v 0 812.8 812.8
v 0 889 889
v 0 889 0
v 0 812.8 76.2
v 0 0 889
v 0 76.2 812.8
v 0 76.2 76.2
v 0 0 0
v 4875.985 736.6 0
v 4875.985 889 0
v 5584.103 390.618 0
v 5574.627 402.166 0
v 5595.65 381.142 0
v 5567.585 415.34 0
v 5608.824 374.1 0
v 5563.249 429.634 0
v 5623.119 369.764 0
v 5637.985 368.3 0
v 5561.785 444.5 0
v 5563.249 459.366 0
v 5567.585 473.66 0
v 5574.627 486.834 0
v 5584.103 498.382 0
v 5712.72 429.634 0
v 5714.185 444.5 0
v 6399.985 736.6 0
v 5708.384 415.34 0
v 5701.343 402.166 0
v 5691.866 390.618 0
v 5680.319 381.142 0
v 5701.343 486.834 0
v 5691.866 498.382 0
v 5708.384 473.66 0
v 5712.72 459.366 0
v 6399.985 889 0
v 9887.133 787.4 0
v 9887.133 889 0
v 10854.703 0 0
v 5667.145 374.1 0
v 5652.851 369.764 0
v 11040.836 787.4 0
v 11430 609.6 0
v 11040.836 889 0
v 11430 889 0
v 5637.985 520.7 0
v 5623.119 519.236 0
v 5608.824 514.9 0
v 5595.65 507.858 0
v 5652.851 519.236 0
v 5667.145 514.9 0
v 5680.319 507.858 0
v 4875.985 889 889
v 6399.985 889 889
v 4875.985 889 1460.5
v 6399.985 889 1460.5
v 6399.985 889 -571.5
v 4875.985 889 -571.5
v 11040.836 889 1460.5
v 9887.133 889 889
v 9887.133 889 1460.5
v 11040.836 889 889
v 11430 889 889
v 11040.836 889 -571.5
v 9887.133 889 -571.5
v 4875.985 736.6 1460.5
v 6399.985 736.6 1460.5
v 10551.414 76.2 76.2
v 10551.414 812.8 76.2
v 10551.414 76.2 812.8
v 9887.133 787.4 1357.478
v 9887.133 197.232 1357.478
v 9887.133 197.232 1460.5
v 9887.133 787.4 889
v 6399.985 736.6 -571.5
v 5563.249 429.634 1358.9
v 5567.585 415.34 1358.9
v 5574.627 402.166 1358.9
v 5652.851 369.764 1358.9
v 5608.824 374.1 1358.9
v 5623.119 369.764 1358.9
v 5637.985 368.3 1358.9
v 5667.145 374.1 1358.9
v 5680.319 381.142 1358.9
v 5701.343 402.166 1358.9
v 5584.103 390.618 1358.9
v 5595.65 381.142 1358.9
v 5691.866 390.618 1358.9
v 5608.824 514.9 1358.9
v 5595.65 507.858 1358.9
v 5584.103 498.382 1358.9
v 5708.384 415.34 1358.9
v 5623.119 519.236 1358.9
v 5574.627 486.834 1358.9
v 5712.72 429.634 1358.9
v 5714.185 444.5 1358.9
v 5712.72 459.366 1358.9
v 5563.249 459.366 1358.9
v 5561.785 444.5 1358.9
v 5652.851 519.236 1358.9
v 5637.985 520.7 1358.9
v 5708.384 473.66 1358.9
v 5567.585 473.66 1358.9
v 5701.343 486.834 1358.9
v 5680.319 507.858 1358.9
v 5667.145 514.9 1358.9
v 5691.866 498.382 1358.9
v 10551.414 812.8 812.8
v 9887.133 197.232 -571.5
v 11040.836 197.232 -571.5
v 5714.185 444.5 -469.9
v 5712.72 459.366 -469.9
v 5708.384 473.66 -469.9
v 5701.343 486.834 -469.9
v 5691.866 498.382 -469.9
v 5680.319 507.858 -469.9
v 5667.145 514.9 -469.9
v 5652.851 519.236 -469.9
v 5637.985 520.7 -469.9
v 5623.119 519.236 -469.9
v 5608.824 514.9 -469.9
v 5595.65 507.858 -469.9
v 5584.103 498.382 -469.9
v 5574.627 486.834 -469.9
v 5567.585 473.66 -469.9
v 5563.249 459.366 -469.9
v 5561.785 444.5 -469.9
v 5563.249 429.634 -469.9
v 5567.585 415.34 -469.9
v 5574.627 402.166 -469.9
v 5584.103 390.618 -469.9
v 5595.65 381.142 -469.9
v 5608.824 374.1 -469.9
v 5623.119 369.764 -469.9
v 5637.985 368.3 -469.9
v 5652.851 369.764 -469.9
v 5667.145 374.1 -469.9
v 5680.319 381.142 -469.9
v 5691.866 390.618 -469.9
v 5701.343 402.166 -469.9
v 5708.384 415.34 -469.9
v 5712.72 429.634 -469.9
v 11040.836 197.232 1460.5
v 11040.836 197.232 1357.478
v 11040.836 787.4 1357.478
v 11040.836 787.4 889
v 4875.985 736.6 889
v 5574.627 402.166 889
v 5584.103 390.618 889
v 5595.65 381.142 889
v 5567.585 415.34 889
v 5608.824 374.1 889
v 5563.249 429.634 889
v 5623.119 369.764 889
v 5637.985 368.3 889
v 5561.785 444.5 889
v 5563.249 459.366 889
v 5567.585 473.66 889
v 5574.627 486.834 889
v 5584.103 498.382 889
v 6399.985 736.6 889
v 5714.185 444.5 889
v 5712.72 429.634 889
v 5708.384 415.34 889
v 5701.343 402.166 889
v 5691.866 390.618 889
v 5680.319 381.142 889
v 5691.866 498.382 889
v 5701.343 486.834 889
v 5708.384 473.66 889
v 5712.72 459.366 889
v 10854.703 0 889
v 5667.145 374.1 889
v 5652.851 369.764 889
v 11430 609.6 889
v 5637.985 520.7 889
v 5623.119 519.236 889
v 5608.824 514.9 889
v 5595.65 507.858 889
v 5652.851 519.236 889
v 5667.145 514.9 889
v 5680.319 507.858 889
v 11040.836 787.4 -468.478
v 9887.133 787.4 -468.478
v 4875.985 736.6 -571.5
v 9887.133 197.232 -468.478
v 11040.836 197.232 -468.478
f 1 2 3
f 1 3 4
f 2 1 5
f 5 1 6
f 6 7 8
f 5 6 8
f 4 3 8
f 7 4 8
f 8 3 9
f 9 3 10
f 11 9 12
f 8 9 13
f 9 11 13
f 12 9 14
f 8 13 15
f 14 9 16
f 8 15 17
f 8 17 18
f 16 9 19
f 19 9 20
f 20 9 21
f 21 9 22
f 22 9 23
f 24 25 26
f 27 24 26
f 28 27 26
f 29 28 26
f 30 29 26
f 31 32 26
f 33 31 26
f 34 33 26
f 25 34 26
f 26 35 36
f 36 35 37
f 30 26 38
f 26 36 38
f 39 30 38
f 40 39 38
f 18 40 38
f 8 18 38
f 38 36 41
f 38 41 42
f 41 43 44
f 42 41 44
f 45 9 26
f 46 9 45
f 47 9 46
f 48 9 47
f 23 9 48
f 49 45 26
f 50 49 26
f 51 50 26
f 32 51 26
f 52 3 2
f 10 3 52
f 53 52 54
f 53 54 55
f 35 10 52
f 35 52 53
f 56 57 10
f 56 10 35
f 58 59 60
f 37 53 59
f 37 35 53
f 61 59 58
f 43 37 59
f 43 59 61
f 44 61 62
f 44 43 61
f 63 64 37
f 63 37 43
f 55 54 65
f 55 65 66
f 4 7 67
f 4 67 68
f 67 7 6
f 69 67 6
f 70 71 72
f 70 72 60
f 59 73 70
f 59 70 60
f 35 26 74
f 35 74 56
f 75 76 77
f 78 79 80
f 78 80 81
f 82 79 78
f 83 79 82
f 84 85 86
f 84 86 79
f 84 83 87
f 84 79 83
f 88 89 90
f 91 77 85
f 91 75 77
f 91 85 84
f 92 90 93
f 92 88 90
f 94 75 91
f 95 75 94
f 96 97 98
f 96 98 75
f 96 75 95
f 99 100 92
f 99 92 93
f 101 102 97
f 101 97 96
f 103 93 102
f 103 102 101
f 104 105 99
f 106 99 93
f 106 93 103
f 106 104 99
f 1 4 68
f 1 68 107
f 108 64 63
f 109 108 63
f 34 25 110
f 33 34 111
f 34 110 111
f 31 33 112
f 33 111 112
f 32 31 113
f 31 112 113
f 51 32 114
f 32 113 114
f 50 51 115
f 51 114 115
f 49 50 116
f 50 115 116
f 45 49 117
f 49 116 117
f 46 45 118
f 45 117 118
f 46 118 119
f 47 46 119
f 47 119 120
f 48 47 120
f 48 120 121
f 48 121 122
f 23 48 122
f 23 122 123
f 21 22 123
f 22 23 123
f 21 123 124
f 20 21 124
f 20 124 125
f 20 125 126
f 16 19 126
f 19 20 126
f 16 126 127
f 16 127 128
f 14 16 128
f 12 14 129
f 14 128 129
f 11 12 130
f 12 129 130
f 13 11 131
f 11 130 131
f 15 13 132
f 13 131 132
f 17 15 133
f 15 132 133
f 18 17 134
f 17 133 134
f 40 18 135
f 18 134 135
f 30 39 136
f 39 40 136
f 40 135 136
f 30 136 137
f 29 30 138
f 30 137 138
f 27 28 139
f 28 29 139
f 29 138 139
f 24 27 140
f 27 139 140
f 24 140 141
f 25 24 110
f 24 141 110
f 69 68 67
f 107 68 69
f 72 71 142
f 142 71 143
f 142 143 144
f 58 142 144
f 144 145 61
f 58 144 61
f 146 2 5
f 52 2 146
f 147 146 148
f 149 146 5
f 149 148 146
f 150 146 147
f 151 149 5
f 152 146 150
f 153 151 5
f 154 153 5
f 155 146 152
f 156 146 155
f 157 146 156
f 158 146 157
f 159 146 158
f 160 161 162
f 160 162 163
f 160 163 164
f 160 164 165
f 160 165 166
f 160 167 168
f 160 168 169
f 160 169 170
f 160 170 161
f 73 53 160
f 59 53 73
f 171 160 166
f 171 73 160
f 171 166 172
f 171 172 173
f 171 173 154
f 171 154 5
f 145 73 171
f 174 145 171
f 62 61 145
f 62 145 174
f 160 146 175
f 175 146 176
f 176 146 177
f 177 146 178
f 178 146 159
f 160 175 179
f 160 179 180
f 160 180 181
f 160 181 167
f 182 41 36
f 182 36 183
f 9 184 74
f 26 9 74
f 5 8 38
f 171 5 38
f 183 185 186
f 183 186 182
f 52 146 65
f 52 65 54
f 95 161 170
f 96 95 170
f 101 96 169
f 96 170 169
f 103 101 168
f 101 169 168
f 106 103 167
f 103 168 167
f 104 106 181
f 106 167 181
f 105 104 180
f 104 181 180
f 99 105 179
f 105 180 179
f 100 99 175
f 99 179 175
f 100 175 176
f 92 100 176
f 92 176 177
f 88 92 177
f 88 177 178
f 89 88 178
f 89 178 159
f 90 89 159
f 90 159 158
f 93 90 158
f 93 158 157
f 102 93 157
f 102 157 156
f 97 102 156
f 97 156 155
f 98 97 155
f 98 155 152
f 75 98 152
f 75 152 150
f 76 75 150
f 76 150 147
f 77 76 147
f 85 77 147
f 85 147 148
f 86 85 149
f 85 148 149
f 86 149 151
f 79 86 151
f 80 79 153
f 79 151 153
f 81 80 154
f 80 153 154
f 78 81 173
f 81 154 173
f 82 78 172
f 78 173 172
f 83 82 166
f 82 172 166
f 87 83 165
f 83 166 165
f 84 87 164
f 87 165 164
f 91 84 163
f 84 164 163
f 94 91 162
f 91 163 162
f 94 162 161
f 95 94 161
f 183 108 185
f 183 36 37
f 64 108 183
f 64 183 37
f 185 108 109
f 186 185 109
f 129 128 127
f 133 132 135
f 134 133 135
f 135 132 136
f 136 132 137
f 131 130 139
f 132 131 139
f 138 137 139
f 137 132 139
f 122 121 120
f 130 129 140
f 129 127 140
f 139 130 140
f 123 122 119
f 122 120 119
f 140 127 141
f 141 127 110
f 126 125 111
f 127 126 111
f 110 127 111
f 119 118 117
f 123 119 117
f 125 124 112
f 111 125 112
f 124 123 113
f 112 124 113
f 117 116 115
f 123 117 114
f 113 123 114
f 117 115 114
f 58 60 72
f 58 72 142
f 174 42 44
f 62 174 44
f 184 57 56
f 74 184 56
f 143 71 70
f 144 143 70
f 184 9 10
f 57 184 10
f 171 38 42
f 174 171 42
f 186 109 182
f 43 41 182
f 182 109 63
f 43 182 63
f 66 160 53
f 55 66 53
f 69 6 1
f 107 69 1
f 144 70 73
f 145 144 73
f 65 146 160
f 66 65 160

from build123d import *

# Parameters (mm, degrees)
BOSS_EXTRUDE1_DEPTH      = 889
BOSS_EXTRUDE3_DEPTH      = 571.5
BOSS_EXTRUDE3_DEPTH_BACK = 1460.5
SKETCH5_W                = 1153.702812307
SKETCH5_H                = 691.768195519
SKETCH5_W_2              = 1524
SKETCH5_H_2              = 152.4
CUT_EXTRUDE3_REACH       = 11174.441
SKETCH6_W                = 468.477816715
SKETCH6_H                = 590.168195519
BOSS_EXTRUDE4_DEPTH      = 469.9
BOSS_EXTRUDE4_DEPTH_BACK = 1358.9
SKETCH7_R                = 76.2
SKETCH8_W                = 736.6
SKETCH8_H                = 736.6
CUT_EXTRUDE4_DEPTH       = 10551.414


with BuildPart() as part:
    # Sketch1 → Boss-Extrude1 (new body)
    with BuildSketch(Plane.XY):
        Polygon((0, 0), (10854.702616032, 0), (11430, 609.6), (11430, 889), (0, 889), align=None)
    extrude(amount=BOSS_EXTRUDE1_DEPTH)

    # Sketch5 → Boss-Extrude3 (add, two sides: drawn at the far end of the back side and taken through both)
    with BuildSketch(Plane.XY.offset(889).offset(-BOSS_EXTRUDE3_DEPTH_BACK)):
        with Locations((10463.984643528, 543.11590224)):
            Rectangle(SKETCH5_W, SKETCH5_H)
        with Locations((5637.984643529, 812.8)):
            Rectangle(SKETCH5_W_2, SKETCH5_H_2)
    extrude(amount=BOSS_EXTRUDE3_DEPTH + BOSS_EXTRUDE3_DEPTH_BACK)

    # Sketch6 → Cut-Extrude3 (cut, up to next)
    with BuildSketch(Plane(origin=(11040.836049682, 0, 0), x_dir=(0, 0, -1), z_dir=(1, 0, 0)), mode=Mode.PRIVATE) as cut_extrude3_sk1:
        with Locations((-1123.238908357, 492.315902241)):
            Rectangle(SKETCH6_W, SKETCH6_H)
    cut_extrude3_tool1 = extrude(cut_extrude3_sk1.sketch, amount=-CUT_EXTRUDE3_REACH, mode=Mode.PRIVATE) & part.part
    # Sketch6 → Cut-Extrude3 (cut, up to next)
    with BuildSketch(Plane(origin=(11040.836049682, 0, 0), x_dir=(0, 0, -1), z_dir=(1, 0, 0)), mode=Mode.PRIVATE) as cut_extrude3_sk2:
        with Locations((234.238908358, 492.315902241)):
            Rectangle(SKETCH6_W, SKETCH6_H)
    cut_extrude3_tool2 = extrude(cut_extrude3_sk2.sketch, amount=-CUT_EXTRUDE3_REACH, mode=Mode.PRIVATE) & part.part
    add(cut_extrude3_tool1.solids().sort_by_distance((11040.83605, 492.315902, 1123.238908))[0], mode=Mode.SUBTRACT)
    add(cut_extrude3_tool2.solids().sort_by_distance((11040.83605, 492.315902, -234.238908))[0], mode=Mode.SUBTRACT)

    # Sketch7 → Boss-Extrude4 (add, two sides: drawn at the far end of the back side and taken through both)
    with BuildSketch(Plane.XY.offset(889).offset(-BOSS_EXTRUDE4_DEPTH_BACK)):
        with Locations((5637.984643529, 444.5)):
            Circle(SKETCH7_R)
    extrude(amount=BOSS_EXTRUDE4_DEPTH + BOSS_EXTRUDE4_DEPTH_BACK)

    # Sketch8 → Cut-Extrude4 (cut)
    with BuildSketch(Plane.ZY):
        with Locations((444.5, 444.5)):
            Rectangle(SKETCH8_W, SKETCH8_H)
    extrude(amount=-CUT_EXTRUDE4_DEPTH, mode=Mode.SUBTRACT)


solid = part.part
